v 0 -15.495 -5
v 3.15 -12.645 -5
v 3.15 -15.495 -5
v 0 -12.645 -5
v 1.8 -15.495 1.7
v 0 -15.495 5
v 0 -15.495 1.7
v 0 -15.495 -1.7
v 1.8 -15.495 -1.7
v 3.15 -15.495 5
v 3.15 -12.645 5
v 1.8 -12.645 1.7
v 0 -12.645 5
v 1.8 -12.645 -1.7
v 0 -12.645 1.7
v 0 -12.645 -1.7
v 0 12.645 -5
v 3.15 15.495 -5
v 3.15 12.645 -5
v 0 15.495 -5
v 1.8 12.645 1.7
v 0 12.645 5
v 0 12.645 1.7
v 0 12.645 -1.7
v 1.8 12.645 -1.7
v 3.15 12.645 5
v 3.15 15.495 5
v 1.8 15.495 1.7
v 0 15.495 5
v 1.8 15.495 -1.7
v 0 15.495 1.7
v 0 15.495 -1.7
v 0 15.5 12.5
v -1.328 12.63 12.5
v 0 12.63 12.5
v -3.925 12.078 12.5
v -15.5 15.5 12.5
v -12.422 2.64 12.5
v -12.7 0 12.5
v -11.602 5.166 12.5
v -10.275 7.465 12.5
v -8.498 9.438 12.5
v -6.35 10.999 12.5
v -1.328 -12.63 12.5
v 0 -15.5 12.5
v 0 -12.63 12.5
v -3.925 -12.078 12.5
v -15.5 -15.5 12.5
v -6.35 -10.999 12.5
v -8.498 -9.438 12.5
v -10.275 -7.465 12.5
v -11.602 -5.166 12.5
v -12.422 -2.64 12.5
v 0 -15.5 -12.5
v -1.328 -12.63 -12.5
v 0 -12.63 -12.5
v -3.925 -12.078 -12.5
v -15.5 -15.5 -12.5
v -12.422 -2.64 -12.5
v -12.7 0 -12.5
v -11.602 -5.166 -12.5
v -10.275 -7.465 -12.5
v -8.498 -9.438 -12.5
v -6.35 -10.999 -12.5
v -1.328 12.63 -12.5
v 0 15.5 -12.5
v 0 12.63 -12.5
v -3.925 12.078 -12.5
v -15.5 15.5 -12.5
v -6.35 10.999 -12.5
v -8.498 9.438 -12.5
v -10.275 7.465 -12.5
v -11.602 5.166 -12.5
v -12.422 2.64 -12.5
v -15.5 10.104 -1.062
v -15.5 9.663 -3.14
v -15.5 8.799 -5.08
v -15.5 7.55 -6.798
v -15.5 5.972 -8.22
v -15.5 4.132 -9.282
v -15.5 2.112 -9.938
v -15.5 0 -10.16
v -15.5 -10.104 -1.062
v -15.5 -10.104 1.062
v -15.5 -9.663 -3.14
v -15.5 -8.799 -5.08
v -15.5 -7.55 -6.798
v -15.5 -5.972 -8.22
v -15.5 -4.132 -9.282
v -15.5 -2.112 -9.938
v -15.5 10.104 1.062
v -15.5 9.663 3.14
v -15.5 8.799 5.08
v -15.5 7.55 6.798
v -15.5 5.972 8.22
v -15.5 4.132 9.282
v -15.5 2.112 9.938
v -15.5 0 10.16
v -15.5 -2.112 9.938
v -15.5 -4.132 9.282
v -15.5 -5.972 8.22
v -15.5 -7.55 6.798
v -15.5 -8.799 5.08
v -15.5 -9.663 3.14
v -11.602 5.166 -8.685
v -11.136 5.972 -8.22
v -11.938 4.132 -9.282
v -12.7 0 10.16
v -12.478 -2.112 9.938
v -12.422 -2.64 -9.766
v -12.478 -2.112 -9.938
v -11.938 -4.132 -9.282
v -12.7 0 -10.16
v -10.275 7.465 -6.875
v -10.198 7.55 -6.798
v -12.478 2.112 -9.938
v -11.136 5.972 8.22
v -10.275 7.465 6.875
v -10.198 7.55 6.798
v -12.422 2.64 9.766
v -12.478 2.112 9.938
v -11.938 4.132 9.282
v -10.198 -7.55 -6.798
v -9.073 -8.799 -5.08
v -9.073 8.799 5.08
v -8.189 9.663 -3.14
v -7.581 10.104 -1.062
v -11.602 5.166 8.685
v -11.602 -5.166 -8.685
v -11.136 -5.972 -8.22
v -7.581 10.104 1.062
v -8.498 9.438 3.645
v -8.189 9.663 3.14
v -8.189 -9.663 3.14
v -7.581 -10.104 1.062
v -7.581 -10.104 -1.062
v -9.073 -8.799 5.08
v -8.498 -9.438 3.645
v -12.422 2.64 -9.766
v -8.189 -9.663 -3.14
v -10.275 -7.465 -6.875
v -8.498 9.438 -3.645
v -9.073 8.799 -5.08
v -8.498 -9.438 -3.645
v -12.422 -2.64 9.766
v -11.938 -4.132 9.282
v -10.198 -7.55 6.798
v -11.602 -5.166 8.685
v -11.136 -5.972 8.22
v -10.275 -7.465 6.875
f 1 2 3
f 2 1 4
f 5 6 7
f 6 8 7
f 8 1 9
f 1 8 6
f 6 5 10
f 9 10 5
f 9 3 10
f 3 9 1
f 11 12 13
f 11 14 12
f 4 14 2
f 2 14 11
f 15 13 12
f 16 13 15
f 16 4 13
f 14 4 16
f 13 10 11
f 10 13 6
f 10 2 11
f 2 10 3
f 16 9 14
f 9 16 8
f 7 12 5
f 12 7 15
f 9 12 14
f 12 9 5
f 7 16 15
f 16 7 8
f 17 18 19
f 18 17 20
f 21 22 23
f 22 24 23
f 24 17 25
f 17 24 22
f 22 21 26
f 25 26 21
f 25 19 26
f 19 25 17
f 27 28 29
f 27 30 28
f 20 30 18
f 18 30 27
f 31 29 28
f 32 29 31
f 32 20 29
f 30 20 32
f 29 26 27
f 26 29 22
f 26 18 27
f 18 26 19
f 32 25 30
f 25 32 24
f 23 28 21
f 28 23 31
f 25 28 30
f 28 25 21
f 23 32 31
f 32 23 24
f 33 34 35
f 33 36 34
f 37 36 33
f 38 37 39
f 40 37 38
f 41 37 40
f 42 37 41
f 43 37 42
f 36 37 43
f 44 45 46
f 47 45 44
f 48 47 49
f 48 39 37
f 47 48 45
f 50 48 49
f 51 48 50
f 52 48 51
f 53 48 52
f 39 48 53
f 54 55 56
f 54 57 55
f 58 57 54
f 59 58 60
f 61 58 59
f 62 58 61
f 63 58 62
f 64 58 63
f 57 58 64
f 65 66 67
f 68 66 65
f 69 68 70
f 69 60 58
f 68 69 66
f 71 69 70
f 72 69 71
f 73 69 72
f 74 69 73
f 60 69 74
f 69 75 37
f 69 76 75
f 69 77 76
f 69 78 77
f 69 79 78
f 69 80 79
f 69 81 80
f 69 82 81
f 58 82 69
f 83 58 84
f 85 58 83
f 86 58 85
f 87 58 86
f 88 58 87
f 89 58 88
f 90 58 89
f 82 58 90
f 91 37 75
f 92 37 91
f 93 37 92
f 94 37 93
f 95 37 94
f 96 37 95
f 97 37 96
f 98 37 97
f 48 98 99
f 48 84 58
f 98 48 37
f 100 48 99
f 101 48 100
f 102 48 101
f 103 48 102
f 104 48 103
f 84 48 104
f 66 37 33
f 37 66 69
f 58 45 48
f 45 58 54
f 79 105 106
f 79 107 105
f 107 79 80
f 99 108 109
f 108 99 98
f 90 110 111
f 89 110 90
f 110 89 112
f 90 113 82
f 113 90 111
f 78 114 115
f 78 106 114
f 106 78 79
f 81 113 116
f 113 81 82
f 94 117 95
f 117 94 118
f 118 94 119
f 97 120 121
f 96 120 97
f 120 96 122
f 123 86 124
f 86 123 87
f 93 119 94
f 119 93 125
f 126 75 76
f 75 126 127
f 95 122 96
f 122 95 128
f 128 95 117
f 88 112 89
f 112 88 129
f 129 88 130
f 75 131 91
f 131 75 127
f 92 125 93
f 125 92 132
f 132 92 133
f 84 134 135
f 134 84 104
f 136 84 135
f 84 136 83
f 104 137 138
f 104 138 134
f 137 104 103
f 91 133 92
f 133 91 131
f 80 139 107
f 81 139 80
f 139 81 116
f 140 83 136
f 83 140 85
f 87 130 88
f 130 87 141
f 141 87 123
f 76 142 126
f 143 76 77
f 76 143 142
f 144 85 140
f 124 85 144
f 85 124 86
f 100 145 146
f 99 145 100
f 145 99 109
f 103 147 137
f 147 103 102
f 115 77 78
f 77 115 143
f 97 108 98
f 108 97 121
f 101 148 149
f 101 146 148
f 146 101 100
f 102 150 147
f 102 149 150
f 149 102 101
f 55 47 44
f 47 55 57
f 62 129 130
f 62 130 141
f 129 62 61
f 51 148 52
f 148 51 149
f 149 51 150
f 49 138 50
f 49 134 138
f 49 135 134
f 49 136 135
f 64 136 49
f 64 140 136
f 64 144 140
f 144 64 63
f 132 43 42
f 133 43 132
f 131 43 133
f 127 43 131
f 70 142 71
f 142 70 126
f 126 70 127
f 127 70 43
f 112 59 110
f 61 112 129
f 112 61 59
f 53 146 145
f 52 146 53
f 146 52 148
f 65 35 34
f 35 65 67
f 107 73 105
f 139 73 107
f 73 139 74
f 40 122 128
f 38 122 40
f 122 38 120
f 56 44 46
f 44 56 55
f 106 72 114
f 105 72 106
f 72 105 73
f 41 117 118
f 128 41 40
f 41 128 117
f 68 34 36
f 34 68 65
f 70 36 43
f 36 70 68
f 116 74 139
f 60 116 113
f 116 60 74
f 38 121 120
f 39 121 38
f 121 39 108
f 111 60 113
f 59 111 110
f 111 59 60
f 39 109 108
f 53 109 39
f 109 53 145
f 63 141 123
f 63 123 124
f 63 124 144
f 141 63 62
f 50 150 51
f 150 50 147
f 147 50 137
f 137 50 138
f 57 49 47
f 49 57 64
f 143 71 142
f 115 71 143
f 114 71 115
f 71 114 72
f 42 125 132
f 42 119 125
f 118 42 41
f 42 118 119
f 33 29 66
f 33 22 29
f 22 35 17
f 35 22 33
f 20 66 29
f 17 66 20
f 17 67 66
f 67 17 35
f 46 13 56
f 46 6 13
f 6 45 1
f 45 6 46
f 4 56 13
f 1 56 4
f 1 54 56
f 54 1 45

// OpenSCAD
module funduct(){
    translate([0.9,0,0])
    for(i=[-1,1]){
        translate([0,14.07*i,0])
            tie();
    }
    difference(){
       cube([31,31,25], center=true);
       scale([0.8, 0.8, 0.8]) rotate([0,90,0]) e3d();
       e3d();
       translate([20,0,0])cube([40,40,40],center=true);
    }
}

funduct();

module e3d(){
 cylinder(d=25.4, h=40, center=true);   
    
}

//e3d();

module tie(){
    rotate([90,90,0])
    difference(){
        cube([10,4.5,2.85], center=true);
        cube([3.4, 1.8, 100], center=true);
    }
    
}
//tie();
